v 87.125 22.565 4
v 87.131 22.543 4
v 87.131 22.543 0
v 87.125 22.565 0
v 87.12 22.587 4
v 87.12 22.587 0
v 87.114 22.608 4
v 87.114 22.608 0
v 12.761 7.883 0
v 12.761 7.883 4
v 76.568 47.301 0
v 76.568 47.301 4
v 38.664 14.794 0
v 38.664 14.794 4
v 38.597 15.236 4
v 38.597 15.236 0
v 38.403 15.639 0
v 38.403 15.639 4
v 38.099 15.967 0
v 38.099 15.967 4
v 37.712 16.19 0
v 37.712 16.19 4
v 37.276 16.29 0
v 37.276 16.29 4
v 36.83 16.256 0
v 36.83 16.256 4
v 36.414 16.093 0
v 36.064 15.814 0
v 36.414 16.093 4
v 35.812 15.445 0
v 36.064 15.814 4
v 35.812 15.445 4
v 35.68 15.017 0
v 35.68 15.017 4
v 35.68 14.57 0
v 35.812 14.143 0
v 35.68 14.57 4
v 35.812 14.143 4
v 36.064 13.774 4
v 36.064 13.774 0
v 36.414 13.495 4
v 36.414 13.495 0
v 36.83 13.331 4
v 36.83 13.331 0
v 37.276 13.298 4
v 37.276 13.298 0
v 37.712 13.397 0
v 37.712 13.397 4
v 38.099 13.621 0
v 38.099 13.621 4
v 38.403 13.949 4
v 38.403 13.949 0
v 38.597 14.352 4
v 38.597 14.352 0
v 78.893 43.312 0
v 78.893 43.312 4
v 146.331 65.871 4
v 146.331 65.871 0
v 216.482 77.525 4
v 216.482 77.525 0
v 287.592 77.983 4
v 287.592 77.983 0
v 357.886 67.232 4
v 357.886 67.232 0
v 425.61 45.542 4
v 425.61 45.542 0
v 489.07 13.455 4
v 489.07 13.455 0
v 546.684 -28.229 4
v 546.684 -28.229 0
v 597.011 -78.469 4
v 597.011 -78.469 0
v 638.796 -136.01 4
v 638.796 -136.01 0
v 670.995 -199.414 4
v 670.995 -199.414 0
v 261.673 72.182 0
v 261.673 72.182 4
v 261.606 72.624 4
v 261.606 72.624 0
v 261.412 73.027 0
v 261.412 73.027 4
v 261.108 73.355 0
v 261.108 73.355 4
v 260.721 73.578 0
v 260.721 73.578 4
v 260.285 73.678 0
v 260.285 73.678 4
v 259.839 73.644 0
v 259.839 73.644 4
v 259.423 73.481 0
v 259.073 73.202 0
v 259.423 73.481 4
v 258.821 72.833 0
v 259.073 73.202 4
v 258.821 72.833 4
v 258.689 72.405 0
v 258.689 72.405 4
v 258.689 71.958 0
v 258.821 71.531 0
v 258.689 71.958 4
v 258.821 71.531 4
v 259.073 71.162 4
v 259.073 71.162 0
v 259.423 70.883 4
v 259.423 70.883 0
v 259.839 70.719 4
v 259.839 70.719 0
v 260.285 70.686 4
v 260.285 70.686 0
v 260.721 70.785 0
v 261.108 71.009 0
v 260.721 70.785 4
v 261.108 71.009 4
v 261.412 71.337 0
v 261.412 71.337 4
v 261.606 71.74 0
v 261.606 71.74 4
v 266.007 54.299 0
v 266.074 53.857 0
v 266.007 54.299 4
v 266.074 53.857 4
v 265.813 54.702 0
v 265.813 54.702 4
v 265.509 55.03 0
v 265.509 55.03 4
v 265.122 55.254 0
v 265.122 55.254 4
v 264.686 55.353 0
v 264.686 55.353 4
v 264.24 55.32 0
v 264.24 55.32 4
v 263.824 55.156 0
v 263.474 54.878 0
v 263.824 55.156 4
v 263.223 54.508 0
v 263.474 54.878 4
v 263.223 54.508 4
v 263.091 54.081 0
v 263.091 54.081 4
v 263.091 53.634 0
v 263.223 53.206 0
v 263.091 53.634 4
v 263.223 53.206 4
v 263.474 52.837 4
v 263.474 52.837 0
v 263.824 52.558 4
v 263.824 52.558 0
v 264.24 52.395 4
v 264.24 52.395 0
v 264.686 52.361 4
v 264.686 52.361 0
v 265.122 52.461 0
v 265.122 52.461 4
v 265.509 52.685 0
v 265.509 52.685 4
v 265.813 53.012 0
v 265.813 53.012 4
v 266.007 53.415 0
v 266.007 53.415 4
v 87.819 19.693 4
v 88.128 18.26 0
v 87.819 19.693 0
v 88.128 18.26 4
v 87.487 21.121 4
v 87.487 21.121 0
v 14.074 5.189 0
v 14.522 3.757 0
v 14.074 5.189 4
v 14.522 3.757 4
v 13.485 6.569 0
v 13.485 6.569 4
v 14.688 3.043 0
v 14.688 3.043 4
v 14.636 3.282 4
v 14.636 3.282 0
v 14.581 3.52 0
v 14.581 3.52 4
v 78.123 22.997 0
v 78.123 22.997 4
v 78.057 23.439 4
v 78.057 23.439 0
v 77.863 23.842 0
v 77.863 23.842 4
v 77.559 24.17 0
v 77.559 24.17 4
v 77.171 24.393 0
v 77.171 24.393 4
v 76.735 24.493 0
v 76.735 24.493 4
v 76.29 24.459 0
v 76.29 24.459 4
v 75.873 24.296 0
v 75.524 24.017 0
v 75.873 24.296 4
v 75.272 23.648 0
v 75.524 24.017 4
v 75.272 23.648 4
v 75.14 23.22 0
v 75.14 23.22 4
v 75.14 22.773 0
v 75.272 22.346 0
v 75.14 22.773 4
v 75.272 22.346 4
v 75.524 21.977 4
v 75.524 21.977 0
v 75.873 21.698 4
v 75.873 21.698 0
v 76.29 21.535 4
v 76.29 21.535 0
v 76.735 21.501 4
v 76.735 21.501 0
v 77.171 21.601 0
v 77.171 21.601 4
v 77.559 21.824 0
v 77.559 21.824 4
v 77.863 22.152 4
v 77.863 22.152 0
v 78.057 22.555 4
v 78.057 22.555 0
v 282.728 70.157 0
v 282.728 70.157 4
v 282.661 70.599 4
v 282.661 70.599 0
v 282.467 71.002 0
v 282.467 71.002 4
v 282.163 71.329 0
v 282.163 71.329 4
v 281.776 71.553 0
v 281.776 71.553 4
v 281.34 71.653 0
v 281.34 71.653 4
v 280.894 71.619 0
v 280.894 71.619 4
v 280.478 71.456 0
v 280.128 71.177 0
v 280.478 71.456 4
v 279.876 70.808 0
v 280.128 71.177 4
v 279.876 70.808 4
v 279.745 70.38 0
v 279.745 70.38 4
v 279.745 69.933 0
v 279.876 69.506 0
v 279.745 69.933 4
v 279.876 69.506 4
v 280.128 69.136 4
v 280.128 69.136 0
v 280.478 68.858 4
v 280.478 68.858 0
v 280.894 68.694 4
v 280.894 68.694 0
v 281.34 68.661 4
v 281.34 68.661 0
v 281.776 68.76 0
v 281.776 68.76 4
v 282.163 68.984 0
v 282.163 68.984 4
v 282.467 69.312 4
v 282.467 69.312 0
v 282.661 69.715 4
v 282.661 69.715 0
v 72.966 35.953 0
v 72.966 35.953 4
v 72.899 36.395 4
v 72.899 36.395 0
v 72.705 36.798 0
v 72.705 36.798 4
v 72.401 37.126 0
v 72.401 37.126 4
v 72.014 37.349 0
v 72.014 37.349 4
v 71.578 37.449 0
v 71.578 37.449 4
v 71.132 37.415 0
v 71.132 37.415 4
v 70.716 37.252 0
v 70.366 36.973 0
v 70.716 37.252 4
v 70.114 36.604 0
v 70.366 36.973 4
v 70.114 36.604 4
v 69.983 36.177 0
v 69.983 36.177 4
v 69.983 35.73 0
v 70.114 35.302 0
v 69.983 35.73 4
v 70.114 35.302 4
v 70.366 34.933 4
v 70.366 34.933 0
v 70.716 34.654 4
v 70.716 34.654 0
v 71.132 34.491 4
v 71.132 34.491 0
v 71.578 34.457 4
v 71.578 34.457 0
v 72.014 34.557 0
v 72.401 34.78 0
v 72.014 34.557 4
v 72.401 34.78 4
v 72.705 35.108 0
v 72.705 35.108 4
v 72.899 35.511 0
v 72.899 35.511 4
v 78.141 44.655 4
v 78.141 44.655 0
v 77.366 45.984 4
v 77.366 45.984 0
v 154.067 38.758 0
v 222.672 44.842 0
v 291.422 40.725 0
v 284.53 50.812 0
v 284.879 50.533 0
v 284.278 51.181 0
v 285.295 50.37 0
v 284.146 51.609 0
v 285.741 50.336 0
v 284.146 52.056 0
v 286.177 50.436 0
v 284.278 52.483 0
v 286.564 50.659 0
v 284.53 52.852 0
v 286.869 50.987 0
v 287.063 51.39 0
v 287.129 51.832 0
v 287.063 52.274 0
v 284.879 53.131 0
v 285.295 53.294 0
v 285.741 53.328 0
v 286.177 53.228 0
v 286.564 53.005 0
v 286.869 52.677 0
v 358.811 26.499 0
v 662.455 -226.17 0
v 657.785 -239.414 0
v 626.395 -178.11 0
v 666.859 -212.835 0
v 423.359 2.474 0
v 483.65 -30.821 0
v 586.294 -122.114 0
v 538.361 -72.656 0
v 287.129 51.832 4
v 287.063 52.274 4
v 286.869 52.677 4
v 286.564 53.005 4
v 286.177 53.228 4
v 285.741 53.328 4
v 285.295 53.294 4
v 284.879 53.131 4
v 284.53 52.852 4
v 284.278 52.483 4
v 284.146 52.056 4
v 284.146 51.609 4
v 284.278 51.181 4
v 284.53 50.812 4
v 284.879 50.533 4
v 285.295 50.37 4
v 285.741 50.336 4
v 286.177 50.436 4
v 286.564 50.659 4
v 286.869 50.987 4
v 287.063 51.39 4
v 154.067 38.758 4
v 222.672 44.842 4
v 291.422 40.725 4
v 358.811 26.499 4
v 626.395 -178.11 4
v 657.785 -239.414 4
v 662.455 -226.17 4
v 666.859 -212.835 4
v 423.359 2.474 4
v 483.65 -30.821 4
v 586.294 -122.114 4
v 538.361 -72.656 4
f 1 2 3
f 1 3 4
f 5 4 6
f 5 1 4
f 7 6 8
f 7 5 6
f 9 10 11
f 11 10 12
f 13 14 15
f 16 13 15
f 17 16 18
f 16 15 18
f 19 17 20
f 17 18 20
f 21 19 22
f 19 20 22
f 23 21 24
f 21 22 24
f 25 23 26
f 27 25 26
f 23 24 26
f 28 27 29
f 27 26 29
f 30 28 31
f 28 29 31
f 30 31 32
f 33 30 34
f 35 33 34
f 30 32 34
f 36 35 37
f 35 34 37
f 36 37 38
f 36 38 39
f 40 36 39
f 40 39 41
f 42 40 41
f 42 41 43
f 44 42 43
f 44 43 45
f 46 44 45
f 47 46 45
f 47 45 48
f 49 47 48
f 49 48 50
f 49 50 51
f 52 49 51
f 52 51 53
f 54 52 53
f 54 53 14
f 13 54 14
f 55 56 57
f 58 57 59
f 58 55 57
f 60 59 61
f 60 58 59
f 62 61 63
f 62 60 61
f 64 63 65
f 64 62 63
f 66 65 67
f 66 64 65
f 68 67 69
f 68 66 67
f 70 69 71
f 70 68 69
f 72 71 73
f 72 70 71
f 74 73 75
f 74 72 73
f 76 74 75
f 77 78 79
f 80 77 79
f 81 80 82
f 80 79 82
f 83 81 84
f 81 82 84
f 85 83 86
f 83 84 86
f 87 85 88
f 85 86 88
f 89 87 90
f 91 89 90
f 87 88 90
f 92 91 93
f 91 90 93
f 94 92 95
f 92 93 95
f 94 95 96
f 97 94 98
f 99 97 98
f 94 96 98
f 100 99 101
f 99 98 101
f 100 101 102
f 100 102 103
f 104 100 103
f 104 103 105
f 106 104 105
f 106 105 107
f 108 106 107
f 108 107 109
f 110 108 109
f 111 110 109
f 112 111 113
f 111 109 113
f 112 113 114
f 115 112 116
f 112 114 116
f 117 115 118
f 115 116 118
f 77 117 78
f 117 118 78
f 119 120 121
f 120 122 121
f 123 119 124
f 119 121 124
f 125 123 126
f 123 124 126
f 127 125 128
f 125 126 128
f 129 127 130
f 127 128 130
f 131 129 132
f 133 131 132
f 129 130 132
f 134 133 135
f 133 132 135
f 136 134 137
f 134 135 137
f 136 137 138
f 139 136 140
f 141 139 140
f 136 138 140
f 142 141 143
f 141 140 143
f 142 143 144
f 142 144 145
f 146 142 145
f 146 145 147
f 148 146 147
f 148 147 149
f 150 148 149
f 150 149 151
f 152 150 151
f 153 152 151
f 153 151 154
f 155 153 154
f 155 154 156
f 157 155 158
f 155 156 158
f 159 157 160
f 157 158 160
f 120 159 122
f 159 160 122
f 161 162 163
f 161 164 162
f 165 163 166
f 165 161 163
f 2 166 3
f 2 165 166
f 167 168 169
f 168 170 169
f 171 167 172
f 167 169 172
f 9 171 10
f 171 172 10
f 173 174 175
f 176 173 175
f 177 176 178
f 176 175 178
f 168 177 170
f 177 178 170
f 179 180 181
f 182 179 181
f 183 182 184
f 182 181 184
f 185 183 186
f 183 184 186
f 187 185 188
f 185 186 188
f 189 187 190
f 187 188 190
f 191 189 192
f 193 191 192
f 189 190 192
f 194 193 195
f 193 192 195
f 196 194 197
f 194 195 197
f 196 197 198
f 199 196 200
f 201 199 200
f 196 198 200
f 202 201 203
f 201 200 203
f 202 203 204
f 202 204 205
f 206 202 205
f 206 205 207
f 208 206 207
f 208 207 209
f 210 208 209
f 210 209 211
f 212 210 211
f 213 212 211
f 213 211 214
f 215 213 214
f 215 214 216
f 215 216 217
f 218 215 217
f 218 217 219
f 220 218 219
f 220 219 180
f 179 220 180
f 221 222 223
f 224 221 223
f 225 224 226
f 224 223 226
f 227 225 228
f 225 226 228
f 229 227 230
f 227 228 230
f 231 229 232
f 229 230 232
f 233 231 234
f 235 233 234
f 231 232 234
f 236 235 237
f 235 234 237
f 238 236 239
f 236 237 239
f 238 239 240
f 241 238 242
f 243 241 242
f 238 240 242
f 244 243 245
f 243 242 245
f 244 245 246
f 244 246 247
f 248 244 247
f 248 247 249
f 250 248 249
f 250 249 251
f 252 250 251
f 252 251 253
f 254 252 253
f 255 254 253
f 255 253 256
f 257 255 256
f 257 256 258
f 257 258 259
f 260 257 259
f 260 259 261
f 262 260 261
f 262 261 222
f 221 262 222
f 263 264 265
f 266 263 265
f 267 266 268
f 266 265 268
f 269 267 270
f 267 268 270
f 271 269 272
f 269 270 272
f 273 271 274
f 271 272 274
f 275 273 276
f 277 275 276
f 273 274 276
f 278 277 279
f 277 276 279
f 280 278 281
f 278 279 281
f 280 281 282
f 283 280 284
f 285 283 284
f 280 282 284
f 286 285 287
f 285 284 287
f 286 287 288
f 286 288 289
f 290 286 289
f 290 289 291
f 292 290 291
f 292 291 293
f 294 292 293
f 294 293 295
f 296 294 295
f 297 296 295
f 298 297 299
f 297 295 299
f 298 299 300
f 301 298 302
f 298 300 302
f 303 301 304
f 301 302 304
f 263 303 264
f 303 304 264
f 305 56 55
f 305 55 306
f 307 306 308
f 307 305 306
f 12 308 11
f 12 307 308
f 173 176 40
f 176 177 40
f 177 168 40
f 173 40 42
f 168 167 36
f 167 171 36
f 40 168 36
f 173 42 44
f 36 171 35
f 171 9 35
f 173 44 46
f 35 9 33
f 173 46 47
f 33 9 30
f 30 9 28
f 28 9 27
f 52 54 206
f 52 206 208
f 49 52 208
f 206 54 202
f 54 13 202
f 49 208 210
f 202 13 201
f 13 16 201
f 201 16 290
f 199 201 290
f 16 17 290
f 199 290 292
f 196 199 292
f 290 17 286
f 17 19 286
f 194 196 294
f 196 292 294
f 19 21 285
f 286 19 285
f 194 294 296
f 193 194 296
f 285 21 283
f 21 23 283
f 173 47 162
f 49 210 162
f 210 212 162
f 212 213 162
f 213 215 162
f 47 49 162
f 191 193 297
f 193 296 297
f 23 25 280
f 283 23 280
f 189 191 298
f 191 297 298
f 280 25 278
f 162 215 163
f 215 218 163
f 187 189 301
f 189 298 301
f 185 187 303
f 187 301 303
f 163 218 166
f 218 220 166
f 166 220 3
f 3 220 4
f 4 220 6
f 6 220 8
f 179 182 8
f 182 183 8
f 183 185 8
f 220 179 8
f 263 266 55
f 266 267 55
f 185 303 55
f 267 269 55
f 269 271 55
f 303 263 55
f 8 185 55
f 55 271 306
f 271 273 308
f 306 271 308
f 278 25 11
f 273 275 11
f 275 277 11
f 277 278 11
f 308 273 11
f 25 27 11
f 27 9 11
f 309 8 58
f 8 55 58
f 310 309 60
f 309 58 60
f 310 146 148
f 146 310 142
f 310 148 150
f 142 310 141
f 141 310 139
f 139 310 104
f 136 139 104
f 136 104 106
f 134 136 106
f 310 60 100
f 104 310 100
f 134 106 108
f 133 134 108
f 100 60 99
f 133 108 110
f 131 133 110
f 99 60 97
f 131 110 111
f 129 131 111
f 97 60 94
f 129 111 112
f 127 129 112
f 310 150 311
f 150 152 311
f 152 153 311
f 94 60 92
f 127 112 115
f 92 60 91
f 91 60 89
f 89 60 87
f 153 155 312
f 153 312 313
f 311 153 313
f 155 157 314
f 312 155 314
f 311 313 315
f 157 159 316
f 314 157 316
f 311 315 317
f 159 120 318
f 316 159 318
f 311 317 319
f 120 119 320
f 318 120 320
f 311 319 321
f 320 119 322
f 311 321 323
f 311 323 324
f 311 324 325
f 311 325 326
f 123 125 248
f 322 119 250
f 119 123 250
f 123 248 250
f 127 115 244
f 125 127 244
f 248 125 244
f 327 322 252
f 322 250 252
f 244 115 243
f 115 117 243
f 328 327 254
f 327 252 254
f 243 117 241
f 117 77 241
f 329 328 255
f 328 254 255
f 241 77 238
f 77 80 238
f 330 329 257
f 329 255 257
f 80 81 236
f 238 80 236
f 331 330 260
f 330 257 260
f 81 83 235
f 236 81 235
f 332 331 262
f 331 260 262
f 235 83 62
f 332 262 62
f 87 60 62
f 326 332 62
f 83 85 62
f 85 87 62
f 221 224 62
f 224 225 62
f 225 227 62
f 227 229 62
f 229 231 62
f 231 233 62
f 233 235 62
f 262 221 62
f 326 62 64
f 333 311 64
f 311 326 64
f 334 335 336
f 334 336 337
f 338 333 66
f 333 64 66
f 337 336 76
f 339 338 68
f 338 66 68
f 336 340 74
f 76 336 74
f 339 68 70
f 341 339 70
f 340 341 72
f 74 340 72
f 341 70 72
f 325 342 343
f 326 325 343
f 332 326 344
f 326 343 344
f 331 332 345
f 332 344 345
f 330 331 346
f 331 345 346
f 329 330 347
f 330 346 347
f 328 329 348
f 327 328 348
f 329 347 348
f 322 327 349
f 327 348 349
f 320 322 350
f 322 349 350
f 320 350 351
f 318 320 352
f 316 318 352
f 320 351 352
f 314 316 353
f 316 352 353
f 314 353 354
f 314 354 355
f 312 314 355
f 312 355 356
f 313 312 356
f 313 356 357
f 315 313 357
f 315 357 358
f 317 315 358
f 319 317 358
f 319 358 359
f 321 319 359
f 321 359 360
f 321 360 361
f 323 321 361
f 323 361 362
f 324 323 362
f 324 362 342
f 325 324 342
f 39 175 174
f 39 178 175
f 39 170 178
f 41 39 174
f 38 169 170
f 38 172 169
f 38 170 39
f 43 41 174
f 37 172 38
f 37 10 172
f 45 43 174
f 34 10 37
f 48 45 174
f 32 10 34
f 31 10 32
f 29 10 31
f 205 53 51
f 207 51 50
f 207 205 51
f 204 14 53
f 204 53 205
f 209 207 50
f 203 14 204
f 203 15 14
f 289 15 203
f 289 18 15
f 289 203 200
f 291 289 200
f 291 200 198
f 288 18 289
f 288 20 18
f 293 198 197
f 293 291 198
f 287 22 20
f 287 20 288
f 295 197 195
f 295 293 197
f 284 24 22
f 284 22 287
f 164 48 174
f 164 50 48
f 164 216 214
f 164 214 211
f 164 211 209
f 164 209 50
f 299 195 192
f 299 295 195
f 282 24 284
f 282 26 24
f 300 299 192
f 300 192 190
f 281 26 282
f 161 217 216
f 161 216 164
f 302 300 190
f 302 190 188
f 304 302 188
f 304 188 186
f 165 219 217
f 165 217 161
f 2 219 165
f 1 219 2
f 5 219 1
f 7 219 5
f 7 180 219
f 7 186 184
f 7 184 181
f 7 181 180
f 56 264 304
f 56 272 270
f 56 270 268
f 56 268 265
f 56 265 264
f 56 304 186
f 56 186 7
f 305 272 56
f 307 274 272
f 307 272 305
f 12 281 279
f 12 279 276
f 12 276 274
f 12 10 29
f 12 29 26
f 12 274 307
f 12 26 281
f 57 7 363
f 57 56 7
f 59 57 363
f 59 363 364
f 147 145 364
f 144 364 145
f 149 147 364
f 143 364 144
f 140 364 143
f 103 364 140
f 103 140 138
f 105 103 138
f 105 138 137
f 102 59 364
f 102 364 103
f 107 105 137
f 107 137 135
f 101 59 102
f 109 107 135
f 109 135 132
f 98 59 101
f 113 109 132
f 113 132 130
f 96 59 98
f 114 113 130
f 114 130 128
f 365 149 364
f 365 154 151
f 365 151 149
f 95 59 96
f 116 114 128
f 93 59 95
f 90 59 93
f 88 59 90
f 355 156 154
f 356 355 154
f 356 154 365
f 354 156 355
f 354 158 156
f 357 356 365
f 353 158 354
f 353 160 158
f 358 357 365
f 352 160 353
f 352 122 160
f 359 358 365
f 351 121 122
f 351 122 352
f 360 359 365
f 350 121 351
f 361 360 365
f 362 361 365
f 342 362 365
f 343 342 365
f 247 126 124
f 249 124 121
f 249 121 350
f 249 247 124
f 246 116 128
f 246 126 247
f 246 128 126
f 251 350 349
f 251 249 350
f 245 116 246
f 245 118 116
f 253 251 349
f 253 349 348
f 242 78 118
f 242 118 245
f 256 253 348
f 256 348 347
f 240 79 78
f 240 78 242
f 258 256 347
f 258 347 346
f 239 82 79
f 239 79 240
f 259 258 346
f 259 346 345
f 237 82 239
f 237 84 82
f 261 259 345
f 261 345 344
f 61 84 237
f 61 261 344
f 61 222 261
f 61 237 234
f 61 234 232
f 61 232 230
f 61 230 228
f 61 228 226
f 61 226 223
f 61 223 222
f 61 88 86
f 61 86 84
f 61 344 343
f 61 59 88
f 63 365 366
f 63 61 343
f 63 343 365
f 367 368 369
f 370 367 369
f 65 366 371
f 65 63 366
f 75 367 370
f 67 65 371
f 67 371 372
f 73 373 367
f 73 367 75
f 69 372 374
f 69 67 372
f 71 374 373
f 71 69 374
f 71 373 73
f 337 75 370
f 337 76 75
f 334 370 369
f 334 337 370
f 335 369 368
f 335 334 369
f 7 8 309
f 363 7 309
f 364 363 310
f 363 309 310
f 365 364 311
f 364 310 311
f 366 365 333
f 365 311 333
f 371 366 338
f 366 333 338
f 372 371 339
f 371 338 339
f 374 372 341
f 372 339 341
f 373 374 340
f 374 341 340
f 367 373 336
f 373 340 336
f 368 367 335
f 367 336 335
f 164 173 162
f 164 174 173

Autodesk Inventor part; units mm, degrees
ref_plane "YZ Plane" through (0, 0, 0) normal (1, 0, 0) x (0, 1, 0)
ref_plane "XZ Plane" through (0, 0, 0) normal (0, 1, 0) x (-1, 0, 0)
ref_plane "XY Plane" through (0, 0, 0) normal (0, 0, 1) x (1, 0, 0)
sketch "Sketch1" plane through (0, 0, 0) normal (0, 0, 1) x (1, 0, 0)
  arc A0 (670.9948, -199.4141) -> (0, 0) centre (254.9219, -370.8299) ccw
  arc A1 (657.7848, -239.4141) -> (30, 0) centre (229.3296, -420.1103) ccw
  arc A2 (657.7848, -239.4141) -> (670.9948, -199.4141) centre (0, 0) ccw
  line L0 (0, 0) -> (30, 0)
  line L1 (657.7848, -239.4141) -> (0, 0)
  line L2 (-143.7228, 0) -> (862.3369, 0) projected
  point P0 (0, 0)
  dimension "d1" = 30
  dimension "d2" = 40
  dimension "d4" = 20
  dimension "d5" = 465
  dimension "d6" = 450
  dimension "d22" = 700
extrude "Extrusion1" add sketch "Sketch1" along normal blind 4 contours A2 A1 L2 A0 | L2 A1 L0 A0
sketch "Sketch2" plane through (0, 0, 4) normal (0, 0, 1) x (1, 0, 0)
  arc A0 (670.9948, -199.4141) -> (0, 0) centre (254.9219, -370.8299) ccw projected
  arc A1 (87.1309, 22.5434) -> (74.166, 50.9844) centre (0, 0) ccw
  line L0 (74.166, 50.9844) -> (0, 0)
  line L1 (0, 0) -> (87.1309, 22.5434)
  line L2 (0, 0) -> (30, 0) projected
  point P0 (78.8927, 43.3122)
  point P1 (0, 0)
  point P2 (0, 0)
  dimension "d9" = 90
  dimension "d16" = 20
extrude "Extrusion2" add sketch "Sketch2" against normal blind 4
sketch "Sketch4" plane through (0, 0, 4) normal (0, 0, 1) x (1, 0, 0)
  line L0 (86.0304, 22.2587) -> (87.1309, 22.5434) projected
  line L1 (74.166, 50.9844) -> (0, 0) projected
  line L2 (87.1309, 22.5434) -> (0, 0)
  line L3 (0, 0) -> (30, 0)
  arc A0 (86.0304, 22.2587) -> (30, 0) centre (229.3296, -420.1103) ccw projected
  line L4 (30, 0) -> (86.0304, 22.2587)
  point P0 (86.0304, 22.2587)
extrude "Extrusion4" cut sketch "Sketch4" against normal blind 10 contours A0 L3 L2
sketch "Sketch6" plane through (0, 0, 4) normal (0, 0, 1) x (1, 0, 0)
  circle A0 centre (71.4659, 35.9531) radius 1.5
  circle A1 centre (76.6234, 22.9969) radius 1.5
  circle A2 centre (37.1637, 14.7938) radius 1.5
  line L0 (0, 0) -> (87.1309, 22.5434) projected
  line L1 (37.1637, 14.7938) -> (0, 0)
  line L2 (0, 0) -> (71.4659, 35.9531)
  line L3 (74.166, 50.9844) -> (0, 0) projected
  line L4 (76.6234, 22.9969) -> (0, 0)
  circle A3 centre (264.574, 53.8573) radius 1.5
  circle A4 centre (260.1726, 72.1818) radius 1.5
  line L5 (261.3927, 67.6302) -> (0, 0)
  line L6 (264.574, 53.8573) -> (0, 0)
  circle A5 centre (281.2279, 70.1567) radius 1.5
  circle A6 centre (285.6292, 51.8321) radius 1.5
  line L7 (264.574, 53.8573) -> (260.1726, 72.1818)
  line L8 (281.2279, 70.1567) -> (260.1726, 72.1818)
  line L9 (281.2279, 70.1567) -> (285.6292, 51.8321)
  line L10 (285.6292, 51.8321) -> (264.574, 53.8573)
  line L11 (260.1726, 72.1818) -> (0, 0)
  dimension "d23" = 7.2
  dimension "d24" = 2.2
  dimension "d25" = 7.8
  dimension "d26" = 80
  dimension "d27" = 80
  dimension "d28" = 40
  dimension "d29" = 3
  dimension "d30" = 3
  dimension "d31" = 3
  dimension "d34" = 3
  dimension "d35" = 3
  dimension "d36" = 3
  dimension "d38" = 270
  dimension "d39" = 270
  dimension "d40" = 109
  dimension "d41" = 3
  dimension "d42" = 3
  dimension "d43" = 20
  dimension "d47" = 1
  dimension "d48" = 270
extrude "Extrusion6" cut sketch "Sketch6" against normal blind 10 from surface at 0 contours A0 | A1 | A2 | L6 L10 A3 | A3 L7 L6 | L11 L7 A4 | A4 L8 L11 | A3 L10 L7 | L7 L8 A4 | L10 L9 A6 | A6 L9 L10 | L8 L9 A5 | A5 L9 L8
sketch "Sketch7" plane through (0, 0, 4) normal (0, 0, 1) x (1, 0, 0)
  line L0 (87.1309, 22.5434) -> (0, 0) projected
  circle A0 centre (0, 0) radius 15
  dimension "d44" = 30
extrude "Extrusion7" cut sketch "Sketch7" against normal blind 10
sketch "Sketch8" plane through (0, 0, 4) normal (0, 0, 1) x (1, 0, 0)
  arc A0 (78.8927, 43.3122) -> (74.166, 50.9844) centre (0, 0) ccw projected
  line L0 (74.166, 50.9844) -> (0, 0)
  line L1 (12.361, 8.4974) -> (74.166, 50.9844) projected
  line L2 (0, 0) -> (82.5313, 50.9844)
  line L3 (82.5313, 50.9844) -> (74.166, 50.9844)
  point P0 (76.568, 47.3005)
  dimension "d49" = 2.8
extrude "Extrusion8" cut sketch "Sketch8" against normal blind 10 contours L2 L0 A0
sketch "Sketch9" plane through (0, 0, 4) normal (0, 0, 1) x (1, 0, 0)
  line L0 (14.5218, 3.7572) -> (87.1309, 22.5434)
  line L1 (87.1309, 22.5434) -> (14.5218, 3.7572) projected
  arc A0 (14.688, 3.0434) -> (14.5218, 3.7572) centre (0, 0) ccw
  line L2 (14.688, 3.0434) -> (88.1281, 18.2602)
  arc A1 (88.1281, 18.2602) -> (87.1309, 22.5434) centre (0, 0) ccw
  line L3 (14.688, 3.0434) -> (0, 0)
  line L4 (0, 0) -> (14.5218, 3.7572)
  arc A2 (78.8927, 43.3122) -> (76.568, 47.3005) centre (0, 0) ccw projected
  dimension "d52" = 2.8
extrude "Extrusion9" add sketch "Sketch9" against normal blind 4 contours L0 A1 L2 A0
properties part number "spoke3"
